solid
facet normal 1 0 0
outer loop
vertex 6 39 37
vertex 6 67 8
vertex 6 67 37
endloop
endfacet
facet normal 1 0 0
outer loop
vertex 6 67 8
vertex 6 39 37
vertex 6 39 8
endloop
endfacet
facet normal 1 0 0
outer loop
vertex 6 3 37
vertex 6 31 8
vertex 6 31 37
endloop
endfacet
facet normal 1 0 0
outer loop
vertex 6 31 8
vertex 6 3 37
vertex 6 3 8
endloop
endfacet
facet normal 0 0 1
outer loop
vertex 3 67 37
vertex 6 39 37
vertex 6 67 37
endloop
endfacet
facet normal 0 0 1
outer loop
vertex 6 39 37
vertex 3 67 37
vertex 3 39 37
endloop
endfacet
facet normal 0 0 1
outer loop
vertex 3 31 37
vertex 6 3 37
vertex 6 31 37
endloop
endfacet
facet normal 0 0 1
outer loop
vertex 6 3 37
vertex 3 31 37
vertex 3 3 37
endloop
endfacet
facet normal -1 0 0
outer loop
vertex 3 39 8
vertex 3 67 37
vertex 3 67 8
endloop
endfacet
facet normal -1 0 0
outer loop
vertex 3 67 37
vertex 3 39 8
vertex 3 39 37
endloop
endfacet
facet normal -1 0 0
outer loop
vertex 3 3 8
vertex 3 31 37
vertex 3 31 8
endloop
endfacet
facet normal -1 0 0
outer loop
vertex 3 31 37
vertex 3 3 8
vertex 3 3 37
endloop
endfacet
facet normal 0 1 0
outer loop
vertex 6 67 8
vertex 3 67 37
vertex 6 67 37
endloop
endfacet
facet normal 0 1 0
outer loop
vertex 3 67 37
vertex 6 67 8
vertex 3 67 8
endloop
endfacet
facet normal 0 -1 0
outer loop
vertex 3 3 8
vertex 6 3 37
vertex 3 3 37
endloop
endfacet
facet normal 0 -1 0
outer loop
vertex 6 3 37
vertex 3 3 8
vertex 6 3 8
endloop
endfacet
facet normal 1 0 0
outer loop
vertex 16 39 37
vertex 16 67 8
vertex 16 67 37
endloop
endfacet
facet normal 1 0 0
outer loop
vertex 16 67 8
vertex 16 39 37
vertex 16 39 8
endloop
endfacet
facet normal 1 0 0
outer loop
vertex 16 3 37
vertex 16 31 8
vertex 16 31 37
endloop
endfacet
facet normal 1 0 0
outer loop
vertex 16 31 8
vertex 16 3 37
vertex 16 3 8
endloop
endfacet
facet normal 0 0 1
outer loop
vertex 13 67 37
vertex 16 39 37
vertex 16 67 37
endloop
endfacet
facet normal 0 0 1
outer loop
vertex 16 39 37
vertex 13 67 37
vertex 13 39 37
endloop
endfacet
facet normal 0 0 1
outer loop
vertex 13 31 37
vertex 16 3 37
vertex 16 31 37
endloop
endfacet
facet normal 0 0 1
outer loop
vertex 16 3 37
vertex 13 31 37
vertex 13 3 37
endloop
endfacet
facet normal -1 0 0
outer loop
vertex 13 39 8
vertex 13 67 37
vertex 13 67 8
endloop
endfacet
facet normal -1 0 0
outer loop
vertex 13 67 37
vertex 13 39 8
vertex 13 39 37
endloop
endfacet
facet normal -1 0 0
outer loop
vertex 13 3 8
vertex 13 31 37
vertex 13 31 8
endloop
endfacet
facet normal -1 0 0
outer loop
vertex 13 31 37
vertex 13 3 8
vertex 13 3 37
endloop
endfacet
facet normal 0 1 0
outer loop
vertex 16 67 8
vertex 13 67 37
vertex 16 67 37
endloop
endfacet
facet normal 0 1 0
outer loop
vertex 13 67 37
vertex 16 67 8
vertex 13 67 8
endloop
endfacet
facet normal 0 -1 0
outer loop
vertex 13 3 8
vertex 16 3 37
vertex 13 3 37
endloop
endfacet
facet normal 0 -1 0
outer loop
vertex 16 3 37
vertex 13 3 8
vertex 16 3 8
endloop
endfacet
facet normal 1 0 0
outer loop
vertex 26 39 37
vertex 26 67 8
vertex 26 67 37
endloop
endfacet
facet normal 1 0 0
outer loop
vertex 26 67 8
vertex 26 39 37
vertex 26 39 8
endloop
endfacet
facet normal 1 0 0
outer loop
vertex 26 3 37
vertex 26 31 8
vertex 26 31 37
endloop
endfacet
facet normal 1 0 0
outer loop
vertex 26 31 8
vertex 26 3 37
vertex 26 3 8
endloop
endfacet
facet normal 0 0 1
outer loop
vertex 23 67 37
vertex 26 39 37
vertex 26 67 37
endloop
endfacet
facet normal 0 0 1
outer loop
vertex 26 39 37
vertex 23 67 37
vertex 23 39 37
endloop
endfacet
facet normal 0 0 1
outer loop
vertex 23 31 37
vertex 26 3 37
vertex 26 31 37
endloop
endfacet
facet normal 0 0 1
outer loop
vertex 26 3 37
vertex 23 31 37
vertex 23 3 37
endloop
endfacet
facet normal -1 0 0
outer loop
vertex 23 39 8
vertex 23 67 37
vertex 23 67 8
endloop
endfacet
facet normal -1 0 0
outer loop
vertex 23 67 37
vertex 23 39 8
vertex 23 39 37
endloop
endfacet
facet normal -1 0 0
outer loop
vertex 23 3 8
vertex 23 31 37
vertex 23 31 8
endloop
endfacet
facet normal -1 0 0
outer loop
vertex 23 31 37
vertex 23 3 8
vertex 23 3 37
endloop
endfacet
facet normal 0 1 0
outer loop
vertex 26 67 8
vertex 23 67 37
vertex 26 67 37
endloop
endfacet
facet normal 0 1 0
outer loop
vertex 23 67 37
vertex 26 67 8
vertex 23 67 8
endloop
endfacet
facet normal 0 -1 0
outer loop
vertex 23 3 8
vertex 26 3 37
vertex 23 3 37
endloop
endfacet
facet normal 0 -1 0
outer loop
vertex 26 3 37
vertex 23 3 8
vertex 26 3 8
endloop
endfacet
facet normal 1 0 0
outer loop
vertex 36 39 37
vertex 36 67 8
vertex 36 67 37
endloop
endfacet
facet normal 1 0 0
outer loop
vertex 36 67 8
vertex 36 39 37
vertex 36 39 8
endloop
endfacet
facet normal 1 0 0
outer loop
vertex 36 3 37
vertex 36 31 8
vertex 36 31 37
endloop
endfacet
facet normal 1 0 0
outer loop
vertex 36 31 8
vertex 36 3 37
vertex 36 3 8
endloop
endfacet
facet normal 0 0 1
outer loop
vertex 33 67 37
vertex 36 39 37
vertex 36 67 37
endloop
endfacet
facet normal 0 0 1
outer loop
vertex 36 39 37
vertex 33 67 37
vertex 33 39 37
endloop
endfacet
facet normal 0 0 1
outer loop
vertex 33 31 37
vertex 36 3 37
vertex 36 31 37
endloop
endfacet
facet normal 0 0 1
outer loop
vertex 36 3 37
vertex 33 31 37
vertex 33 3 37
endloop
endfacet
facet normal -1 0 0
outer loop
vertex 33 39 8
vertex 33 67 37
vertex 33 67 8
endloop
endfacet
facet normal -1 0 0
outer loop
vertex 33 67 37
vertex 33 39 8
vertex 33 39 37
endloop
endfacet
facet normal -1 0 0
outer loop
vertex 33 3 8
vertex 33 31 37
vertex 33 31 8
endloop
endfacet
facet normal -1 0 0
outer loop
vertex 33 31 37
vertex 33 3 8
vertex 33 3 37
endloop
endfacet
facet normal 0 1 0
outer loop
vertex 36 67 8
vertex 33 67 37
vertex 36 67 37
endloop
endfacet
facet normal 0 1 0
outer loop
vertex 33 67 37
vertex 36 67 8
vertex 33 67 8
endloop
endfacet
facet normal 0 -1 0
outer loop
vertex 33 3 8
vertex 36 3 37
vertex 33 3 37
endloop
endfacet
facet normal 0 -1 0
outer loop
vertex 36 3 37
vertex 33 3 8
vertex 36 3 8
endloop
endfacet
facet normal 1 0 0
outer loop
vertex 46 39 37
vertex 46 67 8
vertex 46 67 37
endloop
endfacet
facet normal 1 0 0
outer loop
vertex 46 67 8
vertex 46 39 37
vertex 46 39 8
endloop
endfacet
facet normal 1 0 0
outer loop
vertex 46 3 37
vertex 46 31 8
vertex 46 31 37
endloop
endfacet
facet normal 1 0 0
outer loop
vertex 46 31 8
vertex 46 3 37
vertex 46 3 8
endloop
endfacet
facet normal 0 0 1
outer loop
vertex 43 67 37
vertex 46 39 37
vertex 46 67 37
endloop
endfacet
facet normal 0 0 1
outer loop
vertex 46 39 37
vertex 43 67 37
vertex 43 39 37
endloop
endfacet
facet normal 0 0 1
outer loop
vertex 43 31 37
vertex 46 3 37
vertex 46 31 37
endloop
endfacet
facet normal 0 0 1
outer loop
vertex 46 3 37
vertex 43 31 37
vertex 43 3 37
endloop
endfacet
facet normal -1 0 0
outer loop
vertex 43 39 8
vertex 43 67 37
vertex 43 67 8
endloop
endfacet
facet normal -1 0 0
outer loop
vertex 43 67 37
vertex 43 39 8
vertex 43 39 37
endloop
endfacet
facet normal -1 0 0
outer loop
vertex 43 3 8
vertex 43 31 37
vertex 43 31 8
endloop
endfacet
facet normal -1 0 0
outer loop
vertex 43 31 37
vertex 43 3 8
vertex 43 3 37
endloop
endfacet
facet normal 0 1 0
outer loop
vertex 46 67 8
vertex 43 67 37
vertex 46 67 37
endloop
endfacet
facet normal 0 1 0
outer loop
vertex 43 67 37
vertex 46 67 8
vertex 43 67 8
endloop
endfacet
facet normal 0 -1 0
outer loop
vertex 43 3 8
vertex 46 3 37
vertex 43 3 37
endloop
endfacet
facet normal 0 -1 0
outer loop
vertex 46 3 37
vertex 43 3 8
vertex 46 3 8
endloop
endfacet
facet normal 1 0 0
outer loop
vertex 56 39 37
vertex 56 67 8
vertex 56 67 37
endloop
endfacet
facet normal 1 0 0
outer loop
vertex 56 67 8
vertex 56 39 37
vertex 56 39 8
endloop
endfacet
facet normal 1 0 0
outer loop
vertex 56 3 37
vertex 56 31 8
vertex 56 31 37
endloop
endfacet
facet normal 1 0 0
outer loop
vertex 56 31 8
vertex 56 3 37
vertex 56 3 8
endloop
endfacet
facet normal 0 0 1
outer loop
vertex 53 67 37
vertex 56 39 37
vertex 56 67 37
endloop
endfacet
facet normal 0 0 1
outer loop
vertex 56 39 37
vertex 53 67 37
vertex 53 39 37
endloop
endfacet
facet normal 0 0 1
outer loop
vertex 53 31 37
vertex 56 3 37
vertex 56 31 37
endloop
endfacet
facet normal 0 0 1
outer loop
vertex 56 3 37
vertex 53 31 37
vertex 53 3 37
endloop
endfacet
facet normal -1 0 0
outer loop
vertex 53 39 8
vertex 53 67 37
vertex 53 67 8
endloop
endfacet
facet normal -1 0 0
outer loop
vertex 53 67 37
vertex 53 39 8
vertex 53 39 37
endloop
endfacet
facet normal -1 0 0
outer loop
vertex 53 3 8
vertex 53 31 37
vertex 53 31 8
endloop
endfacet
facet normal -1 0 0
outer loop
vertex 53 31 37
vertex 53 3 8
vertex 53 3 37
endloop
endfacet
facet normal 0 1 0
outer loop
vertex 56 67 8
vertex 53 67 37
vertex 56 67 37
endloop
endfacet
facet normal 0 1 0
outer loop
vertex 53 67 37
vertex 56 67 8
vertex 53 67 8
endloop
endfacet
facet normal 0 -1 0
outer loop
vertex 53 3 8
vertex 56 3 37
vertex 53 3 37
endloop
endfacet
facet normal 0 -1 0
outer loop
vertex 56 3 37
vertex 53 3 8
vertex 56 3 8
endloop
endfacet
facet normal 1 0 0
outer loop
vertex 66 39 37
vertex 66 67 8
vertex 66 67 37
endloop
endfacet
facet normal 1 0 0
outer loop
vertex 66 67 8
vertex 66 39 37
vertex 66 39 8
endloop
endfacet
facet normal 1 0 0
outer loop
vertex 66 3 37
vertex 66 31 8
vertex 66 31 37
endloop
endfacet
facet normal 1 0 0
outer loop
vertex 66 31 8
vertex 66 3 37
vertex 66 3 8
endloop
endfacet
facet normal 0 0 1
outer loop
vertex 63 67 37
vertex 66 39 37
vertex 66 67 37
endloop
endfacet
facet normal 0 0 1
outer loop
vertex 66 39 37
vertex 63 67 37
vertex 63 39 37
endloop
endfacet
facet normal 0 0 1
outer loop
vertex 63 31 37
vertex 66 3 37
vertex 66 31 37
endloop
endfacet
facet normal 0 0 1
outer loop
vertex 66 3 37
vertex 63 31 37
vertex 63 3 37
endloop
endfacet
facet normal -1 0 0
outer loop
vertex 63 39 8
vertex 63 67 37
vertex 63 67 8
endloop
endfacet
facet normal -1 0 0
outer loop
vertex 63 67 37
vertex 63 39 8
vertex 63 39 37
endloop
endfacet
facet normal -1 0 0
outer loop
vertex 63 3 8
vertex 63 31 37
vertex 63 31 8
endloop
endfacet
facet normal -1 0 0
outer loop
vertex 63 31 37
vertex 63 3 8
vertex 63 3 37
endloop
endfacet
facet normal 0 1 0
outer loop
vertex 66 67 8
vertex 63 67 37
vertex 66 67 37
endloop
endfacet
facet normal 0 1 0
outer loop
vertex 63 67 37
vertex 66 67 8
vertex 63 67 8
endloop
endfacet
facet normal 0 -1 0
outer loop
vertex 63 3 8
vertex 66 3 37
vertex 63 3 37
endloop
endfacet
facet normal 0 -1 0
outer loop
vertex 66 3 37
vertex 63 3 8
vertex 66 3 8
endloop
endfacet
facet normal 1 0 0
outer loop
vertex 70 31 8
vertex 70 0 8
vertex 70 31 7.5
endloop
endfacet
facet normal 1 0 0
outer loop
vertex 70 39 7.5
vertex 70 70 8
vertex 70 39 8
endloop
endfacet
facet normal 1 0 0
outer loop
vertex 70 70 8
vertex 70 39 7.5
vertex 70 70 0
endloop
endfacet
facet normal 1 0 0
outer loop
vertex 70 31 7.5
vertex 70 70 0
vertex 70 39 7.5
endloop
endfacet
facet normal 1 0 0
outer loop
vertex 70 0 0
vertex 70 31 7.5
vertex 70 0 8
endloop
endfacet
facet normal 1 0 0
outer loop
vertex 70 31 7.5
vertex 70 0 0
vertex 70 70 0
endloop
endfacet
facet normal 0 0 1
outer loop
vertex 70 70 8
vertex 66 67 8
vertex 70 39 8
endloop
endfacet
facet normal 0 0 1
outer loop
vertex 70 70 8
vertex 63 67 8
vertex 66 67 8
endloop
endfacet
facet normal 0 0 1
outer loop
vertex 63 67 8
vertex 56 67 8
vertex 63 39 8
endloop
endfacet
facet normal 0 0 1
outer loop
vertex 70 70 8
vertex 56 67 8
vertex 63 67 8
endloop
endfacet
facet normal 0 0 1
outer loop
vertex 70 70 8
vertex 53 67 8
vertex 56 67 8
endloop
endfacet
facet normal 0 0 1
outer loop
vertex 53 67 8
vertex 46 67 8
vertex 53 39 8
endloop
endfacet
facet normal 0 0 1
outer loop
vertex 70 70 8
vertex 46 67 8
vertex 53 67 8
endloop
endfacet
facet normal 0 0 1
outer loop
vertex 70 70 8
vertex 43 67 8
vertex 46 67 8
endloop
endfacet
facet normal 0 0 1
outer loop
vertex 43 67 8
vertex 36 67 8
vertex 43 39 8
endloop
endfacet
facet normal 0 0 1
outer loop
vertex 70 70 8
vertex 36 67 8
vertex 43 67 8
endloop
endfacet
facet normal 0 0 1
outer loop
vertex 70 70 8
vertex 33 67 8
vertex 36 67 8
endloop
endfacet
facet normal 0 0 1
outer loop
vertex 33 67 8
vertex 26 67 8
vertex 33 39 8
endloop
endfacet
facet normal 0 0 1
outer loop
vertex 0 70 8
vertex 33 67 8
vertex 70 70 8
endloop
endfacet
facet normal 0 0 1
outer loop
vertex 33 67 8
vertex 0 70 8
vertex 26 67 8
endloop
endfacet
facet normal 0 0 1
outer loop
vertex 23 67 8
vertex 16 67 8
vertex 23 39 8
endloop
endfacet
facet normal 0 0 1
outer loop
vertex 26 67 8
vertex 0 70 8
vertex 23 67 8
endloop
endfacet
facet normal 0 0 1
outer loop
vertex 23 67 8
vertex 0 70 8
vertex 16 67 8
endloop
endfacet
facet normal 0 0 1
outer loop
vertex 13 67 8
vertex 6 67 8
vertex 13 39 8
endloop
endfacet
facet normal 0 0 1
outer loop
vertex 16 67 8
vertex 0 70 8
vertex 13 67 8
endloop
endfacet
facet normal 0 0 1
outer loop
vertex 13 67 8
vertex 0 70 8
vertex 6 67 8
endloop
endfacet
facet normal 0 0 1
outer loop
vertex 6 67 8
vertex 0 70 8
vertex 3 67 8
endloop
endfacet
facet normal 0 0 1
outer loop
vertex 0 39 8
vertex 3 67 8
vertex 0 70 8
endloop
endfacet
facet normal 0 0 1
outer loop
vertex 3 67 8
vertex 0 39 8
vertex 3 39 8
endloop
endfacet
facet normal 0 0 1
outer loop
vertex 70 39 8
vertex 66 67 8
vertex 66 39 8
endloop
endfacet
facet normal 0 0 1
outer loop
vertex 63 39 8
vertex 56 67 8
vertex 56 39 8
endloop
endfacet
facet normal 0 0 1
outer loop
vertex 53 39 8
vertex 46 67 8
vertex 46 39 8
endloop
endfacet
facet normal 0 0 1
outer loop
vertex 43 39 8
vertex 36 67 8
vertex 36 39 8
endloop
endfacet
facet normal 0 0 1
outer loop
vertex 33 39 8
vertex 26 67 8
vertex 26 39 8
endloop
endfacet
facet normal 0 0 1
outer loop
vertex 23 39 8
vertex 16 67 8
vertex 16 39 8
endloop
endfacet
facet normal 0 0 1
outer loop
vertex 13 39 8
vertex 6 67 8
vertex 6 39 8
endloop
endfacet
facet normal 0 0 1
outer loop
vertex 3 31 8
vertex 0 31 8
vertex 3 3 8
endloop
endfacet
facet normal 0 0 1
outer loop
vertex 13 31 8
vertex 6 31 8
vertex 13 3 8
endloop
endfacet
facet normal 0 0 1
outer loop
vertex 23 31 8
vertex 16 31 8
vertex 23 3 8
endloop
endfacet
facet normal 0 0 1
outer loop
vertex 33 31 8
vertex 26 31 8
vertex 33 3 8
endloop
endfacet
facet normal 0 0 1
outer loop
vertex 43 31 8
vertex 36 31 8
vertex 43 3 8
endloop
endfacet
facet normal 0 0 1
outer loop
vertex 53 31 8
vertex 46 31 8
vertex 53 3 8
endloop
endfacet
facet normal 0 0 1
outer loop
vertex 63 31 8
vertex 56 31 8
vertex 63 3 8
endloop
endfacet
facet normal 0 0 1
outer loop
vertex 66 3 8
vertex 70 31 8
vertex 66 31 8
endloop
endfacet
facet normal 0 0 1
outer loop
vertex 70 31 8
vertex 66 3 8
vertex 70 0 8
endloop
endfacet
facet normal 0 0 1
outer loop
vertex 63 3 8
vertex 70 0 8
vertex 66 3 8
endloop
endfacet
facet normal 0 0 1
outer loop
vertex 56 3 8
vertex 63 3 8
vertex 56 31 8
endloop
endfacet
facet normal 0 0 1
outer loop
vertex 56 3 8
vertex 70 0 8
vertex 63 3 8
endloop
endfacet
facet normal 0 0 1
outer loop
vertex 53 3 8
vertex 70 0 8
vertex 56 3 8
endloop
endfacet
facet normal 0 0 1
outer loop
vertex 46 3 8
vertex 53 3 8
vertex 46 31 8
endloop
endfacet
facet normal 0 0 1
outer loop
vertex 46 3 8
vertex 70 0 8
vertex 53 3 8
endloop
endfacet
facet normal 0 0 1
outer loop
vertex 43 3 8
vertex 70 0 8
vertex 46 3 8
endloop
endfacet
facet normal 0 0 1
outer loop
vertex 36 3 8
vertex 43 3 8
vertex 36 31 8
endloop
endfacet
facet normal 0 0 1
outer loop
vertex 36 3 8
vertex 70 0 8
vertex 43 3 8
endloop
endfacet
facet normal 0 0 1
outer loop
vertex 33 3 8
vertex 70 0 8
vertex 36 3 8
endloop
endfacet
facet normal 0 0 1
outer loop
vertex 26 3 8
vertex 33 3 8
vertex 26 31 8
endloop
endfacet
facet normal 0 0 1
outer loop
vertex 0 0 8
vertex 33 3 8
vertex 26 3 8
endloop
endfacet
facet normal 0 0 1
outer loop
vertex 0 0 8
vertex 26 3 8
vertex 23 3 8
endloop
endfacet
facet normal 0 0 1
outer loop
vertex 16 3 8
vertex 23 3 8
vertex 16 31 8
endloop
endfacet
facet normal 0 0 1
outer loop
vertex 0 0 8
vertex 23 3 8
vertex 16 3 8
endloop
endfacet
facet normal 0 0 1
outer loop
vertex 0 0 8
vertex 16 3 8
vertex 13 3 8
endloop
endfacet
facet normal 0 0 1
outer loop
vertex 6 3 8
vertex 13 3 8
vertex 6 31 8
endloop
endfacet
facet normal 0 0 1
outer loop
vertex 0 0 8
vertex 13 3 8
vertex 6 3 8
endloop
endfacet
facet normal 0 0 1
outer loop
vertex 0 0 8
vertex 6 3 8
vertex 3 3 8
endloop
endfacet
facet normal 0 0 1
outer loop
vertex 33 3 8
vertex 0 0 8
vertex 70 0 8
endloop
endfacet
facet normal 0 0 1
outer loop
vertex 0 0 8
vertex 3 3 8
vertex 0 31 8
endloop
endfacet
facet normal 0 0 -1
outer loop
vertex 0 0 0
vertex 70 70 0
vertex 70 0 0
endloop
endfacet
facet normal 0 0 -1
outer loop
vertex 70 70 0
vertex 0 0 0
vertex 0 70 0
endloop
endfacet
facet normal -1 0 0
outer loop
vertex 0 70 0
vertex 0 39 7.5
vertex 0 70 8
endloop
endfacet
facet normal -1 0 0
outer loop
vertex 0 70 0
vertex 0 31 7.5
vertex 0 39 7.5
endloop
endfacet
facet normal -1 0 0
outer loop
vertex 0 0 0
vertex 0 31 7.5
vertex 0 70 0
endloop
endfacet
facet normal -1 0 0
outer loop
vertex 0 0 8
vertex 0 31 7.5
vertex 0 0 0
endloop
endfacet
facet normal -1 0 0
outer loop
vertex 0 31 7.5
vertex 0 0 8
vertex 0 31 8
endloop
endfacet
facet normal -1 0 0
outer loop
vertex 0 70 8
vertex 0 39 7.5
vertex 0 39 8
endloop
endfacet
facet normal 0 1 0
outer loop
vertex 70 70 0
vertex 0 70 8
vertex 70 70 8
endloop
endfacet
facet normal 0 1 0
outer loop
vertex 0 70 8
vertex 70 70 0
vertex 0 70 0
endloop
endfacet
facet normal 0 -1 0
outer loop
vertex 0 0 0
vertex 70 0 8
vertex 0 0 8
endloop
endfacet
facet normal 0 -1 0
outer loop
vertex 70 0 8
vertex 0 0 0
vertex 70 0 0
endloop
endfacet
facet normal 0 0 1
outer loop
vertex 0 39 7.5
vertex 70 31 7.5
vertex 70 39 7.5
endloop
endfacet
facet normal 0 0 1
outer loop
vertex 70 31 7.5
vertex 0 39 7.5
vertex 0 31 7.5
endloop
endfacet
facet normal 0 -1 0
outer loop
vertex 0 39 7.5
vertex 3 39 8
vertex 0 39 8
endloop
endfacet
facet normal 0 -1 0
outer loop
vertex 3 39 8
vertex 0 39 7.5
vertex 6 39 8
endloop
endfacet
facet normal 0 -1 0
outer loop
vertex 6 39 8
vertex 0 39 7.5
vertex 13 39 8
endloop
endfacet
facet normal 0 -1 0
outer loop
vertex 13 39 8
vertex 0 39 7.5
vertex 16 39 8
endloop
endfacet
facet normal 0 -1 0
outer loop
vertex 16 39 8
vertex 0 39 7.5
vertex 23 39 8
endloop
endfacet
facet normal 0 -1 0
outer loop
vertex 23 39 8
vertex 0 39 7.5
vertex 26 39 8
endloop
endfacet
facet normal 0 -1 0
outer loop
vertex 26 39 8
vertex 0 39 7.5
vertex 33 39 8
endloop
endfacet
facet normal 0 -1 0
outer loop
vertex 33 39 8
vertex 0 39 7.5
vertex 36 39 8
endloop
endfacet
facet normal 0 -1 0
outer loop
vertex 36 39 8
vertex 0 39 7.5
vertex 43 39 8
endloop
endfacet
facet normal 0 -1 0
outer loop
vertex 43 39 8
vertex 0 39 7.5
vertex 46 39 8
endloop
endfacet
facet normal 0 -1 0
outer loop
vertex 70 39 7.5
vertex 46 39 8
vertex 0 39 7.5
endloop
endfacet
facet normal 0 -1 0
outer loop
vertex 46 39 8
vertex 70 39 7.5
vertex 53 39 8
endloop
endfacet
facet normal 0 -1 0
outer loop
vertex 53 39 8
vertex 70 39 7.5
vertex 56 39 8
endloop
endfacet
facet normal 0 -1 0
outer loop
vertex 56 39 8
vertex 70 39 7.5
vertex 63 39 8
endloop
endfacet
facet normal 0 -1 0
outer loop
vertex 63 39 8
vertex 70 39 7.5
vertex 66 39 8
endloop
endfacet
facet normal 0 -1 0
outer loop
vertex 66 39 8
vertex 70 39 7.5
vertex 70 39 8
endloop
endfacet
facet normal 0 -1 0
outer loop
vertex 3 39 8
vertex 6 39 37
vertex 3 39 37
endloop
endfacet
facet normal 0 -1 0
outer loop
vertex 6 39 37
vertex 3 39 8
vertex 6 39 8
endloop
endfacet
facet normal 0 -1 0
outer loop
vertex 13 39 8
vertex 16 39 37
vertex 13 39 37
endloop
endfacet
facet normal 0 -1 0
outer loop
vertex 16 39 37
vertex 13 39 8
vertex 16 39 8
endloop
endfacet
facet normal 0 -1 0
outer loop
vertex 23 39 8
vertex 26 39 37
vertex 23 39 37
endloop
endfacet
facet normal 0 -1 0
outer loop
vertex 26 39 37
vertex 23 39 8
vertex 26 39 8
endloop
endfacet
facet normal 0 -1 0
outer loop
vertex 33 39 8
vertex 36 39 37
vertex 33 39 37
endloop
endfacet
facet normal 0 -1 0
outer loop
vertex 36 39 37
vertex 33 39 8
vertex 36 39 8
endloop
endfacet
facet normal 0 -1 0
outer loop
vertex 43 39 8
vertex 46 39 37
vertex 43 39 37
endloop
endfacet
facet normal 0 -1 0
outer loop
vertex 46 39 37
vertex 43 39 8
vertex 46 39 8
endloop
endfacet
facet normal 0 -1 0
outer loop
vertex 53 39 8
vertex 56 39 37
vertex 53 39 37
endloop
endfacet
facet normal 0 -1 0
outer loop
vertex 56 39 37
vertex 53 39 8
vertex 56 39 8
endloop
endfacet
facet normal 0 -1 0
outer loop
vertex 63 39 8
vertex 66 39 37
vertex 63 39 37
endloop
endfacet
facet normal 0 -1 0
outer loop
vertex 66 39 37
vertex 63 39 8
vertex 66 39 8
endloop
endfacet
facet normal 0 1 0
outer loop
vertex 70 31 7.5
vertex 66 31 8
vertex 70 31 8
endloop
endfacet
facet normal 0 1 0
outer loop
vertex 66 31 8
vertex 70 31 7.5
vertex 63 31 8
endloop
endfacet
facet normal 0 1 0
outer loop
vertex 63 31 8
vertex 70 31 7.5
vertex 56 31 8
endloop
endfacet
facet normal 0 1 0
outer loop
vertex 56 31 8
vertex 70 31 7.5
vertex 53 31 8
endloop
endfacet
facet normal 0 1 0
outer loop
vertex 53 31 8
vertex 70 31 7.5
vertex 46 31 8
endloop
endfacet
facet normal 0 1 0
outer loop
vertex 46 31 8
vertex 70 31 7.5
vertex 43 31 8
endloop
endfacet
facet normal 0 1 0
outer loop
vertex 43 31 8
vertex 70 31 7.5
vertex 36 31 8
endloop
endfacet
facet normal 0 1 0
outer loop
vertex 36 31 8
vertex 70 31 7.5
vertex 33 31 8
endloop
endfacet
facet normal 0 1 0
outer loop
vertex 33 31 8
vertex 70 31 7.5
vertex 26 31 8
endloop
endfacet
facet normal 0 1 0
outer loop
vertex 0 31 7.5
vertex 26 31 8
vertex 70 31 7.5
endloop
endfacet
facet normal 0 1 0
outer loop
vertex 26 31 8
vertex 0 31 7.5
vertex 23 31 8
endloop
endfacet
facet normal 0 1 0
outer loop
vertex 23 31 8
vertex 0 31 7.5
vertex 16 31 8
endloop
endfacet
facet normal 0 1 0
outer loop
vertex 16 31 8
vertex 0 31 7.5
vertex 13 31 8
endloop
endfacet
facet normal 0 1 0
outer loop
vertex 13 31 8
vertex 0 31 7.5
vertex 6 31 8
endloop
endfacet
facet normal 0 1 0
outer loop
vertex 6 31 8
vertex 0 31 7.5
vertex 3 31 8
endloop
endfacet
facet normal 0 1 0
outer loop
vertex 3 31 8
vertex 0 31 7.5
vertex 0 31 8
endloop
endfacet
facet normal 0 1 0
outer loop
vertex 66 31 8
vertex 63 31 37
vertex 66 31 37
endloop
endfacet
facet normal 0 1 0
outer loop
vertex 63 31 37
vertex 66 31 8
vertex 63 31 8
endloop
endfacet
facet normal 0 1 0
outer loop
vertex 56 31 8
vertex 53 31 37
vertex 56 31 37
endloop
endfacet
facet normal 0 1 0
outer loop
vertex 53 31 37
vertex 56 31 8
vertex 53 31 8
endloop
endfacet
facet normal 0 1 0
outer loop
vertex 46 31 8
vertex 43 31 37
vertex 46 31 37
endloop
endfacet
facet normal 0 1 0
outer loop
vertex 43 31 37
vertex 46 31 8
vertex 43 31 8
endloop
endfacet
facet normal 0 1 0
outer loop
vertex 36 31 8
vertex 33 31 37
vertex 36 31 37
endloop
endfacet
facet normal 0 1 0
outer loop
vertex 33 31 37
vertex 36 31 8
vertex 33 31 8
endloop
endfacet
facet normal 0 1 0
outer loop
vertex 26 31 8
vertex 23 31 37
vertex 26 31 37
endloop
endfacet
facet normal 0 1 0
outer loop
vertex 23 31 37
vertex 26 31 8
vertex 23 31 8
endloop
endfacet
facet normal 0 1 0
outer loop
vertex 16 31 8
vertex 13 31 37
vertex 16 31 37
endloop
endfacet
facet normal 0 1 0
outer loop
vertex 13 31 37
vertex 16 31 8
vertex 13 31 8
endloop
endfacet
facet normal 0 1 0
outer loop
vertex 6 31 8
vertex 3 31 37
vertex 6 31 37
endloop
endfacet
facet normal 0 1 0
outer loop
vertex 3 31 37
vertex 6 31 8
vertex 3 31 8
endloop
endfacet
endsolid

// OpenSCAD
$fn = 32;

// ----------------------------------------------------------------------
// Heatsink: slotted fin block
// ----------------------------------------------------------------------

// --- parameters (mm) ---
base_l = 70;              // base length, X
base_w = 70;              // base width, Y
base_t = 8;               // base plate thickness
fin_h = 30;               // fin height above the base
fin_t = 3;                // fin thickness
edge = 3;                 // margin from the base ends
pitch = 10;               // fin pitch
slot_w = 8;               // central slot width, Y

n_fins = floor((base_l - 2 * edge - fin_t) / pitch) + 1;  // fin count
total_h = base_t + fin_h - 1;  // overall height

difference() {
union() {
  cube([base_l, base_w, base_t]);
  for (i = [0 : n_fins - 1])
    translate([edge + i * pitch, edge, base_t - 1])
      cube([fin_t, base_w - 2 * edge, fin_h]);
}
  translate([-1, base_w / 2 - slot_w / 2, base_t - 0.5])
    cube([base_l + 2, slot_w, fin_h + 2]);
}
